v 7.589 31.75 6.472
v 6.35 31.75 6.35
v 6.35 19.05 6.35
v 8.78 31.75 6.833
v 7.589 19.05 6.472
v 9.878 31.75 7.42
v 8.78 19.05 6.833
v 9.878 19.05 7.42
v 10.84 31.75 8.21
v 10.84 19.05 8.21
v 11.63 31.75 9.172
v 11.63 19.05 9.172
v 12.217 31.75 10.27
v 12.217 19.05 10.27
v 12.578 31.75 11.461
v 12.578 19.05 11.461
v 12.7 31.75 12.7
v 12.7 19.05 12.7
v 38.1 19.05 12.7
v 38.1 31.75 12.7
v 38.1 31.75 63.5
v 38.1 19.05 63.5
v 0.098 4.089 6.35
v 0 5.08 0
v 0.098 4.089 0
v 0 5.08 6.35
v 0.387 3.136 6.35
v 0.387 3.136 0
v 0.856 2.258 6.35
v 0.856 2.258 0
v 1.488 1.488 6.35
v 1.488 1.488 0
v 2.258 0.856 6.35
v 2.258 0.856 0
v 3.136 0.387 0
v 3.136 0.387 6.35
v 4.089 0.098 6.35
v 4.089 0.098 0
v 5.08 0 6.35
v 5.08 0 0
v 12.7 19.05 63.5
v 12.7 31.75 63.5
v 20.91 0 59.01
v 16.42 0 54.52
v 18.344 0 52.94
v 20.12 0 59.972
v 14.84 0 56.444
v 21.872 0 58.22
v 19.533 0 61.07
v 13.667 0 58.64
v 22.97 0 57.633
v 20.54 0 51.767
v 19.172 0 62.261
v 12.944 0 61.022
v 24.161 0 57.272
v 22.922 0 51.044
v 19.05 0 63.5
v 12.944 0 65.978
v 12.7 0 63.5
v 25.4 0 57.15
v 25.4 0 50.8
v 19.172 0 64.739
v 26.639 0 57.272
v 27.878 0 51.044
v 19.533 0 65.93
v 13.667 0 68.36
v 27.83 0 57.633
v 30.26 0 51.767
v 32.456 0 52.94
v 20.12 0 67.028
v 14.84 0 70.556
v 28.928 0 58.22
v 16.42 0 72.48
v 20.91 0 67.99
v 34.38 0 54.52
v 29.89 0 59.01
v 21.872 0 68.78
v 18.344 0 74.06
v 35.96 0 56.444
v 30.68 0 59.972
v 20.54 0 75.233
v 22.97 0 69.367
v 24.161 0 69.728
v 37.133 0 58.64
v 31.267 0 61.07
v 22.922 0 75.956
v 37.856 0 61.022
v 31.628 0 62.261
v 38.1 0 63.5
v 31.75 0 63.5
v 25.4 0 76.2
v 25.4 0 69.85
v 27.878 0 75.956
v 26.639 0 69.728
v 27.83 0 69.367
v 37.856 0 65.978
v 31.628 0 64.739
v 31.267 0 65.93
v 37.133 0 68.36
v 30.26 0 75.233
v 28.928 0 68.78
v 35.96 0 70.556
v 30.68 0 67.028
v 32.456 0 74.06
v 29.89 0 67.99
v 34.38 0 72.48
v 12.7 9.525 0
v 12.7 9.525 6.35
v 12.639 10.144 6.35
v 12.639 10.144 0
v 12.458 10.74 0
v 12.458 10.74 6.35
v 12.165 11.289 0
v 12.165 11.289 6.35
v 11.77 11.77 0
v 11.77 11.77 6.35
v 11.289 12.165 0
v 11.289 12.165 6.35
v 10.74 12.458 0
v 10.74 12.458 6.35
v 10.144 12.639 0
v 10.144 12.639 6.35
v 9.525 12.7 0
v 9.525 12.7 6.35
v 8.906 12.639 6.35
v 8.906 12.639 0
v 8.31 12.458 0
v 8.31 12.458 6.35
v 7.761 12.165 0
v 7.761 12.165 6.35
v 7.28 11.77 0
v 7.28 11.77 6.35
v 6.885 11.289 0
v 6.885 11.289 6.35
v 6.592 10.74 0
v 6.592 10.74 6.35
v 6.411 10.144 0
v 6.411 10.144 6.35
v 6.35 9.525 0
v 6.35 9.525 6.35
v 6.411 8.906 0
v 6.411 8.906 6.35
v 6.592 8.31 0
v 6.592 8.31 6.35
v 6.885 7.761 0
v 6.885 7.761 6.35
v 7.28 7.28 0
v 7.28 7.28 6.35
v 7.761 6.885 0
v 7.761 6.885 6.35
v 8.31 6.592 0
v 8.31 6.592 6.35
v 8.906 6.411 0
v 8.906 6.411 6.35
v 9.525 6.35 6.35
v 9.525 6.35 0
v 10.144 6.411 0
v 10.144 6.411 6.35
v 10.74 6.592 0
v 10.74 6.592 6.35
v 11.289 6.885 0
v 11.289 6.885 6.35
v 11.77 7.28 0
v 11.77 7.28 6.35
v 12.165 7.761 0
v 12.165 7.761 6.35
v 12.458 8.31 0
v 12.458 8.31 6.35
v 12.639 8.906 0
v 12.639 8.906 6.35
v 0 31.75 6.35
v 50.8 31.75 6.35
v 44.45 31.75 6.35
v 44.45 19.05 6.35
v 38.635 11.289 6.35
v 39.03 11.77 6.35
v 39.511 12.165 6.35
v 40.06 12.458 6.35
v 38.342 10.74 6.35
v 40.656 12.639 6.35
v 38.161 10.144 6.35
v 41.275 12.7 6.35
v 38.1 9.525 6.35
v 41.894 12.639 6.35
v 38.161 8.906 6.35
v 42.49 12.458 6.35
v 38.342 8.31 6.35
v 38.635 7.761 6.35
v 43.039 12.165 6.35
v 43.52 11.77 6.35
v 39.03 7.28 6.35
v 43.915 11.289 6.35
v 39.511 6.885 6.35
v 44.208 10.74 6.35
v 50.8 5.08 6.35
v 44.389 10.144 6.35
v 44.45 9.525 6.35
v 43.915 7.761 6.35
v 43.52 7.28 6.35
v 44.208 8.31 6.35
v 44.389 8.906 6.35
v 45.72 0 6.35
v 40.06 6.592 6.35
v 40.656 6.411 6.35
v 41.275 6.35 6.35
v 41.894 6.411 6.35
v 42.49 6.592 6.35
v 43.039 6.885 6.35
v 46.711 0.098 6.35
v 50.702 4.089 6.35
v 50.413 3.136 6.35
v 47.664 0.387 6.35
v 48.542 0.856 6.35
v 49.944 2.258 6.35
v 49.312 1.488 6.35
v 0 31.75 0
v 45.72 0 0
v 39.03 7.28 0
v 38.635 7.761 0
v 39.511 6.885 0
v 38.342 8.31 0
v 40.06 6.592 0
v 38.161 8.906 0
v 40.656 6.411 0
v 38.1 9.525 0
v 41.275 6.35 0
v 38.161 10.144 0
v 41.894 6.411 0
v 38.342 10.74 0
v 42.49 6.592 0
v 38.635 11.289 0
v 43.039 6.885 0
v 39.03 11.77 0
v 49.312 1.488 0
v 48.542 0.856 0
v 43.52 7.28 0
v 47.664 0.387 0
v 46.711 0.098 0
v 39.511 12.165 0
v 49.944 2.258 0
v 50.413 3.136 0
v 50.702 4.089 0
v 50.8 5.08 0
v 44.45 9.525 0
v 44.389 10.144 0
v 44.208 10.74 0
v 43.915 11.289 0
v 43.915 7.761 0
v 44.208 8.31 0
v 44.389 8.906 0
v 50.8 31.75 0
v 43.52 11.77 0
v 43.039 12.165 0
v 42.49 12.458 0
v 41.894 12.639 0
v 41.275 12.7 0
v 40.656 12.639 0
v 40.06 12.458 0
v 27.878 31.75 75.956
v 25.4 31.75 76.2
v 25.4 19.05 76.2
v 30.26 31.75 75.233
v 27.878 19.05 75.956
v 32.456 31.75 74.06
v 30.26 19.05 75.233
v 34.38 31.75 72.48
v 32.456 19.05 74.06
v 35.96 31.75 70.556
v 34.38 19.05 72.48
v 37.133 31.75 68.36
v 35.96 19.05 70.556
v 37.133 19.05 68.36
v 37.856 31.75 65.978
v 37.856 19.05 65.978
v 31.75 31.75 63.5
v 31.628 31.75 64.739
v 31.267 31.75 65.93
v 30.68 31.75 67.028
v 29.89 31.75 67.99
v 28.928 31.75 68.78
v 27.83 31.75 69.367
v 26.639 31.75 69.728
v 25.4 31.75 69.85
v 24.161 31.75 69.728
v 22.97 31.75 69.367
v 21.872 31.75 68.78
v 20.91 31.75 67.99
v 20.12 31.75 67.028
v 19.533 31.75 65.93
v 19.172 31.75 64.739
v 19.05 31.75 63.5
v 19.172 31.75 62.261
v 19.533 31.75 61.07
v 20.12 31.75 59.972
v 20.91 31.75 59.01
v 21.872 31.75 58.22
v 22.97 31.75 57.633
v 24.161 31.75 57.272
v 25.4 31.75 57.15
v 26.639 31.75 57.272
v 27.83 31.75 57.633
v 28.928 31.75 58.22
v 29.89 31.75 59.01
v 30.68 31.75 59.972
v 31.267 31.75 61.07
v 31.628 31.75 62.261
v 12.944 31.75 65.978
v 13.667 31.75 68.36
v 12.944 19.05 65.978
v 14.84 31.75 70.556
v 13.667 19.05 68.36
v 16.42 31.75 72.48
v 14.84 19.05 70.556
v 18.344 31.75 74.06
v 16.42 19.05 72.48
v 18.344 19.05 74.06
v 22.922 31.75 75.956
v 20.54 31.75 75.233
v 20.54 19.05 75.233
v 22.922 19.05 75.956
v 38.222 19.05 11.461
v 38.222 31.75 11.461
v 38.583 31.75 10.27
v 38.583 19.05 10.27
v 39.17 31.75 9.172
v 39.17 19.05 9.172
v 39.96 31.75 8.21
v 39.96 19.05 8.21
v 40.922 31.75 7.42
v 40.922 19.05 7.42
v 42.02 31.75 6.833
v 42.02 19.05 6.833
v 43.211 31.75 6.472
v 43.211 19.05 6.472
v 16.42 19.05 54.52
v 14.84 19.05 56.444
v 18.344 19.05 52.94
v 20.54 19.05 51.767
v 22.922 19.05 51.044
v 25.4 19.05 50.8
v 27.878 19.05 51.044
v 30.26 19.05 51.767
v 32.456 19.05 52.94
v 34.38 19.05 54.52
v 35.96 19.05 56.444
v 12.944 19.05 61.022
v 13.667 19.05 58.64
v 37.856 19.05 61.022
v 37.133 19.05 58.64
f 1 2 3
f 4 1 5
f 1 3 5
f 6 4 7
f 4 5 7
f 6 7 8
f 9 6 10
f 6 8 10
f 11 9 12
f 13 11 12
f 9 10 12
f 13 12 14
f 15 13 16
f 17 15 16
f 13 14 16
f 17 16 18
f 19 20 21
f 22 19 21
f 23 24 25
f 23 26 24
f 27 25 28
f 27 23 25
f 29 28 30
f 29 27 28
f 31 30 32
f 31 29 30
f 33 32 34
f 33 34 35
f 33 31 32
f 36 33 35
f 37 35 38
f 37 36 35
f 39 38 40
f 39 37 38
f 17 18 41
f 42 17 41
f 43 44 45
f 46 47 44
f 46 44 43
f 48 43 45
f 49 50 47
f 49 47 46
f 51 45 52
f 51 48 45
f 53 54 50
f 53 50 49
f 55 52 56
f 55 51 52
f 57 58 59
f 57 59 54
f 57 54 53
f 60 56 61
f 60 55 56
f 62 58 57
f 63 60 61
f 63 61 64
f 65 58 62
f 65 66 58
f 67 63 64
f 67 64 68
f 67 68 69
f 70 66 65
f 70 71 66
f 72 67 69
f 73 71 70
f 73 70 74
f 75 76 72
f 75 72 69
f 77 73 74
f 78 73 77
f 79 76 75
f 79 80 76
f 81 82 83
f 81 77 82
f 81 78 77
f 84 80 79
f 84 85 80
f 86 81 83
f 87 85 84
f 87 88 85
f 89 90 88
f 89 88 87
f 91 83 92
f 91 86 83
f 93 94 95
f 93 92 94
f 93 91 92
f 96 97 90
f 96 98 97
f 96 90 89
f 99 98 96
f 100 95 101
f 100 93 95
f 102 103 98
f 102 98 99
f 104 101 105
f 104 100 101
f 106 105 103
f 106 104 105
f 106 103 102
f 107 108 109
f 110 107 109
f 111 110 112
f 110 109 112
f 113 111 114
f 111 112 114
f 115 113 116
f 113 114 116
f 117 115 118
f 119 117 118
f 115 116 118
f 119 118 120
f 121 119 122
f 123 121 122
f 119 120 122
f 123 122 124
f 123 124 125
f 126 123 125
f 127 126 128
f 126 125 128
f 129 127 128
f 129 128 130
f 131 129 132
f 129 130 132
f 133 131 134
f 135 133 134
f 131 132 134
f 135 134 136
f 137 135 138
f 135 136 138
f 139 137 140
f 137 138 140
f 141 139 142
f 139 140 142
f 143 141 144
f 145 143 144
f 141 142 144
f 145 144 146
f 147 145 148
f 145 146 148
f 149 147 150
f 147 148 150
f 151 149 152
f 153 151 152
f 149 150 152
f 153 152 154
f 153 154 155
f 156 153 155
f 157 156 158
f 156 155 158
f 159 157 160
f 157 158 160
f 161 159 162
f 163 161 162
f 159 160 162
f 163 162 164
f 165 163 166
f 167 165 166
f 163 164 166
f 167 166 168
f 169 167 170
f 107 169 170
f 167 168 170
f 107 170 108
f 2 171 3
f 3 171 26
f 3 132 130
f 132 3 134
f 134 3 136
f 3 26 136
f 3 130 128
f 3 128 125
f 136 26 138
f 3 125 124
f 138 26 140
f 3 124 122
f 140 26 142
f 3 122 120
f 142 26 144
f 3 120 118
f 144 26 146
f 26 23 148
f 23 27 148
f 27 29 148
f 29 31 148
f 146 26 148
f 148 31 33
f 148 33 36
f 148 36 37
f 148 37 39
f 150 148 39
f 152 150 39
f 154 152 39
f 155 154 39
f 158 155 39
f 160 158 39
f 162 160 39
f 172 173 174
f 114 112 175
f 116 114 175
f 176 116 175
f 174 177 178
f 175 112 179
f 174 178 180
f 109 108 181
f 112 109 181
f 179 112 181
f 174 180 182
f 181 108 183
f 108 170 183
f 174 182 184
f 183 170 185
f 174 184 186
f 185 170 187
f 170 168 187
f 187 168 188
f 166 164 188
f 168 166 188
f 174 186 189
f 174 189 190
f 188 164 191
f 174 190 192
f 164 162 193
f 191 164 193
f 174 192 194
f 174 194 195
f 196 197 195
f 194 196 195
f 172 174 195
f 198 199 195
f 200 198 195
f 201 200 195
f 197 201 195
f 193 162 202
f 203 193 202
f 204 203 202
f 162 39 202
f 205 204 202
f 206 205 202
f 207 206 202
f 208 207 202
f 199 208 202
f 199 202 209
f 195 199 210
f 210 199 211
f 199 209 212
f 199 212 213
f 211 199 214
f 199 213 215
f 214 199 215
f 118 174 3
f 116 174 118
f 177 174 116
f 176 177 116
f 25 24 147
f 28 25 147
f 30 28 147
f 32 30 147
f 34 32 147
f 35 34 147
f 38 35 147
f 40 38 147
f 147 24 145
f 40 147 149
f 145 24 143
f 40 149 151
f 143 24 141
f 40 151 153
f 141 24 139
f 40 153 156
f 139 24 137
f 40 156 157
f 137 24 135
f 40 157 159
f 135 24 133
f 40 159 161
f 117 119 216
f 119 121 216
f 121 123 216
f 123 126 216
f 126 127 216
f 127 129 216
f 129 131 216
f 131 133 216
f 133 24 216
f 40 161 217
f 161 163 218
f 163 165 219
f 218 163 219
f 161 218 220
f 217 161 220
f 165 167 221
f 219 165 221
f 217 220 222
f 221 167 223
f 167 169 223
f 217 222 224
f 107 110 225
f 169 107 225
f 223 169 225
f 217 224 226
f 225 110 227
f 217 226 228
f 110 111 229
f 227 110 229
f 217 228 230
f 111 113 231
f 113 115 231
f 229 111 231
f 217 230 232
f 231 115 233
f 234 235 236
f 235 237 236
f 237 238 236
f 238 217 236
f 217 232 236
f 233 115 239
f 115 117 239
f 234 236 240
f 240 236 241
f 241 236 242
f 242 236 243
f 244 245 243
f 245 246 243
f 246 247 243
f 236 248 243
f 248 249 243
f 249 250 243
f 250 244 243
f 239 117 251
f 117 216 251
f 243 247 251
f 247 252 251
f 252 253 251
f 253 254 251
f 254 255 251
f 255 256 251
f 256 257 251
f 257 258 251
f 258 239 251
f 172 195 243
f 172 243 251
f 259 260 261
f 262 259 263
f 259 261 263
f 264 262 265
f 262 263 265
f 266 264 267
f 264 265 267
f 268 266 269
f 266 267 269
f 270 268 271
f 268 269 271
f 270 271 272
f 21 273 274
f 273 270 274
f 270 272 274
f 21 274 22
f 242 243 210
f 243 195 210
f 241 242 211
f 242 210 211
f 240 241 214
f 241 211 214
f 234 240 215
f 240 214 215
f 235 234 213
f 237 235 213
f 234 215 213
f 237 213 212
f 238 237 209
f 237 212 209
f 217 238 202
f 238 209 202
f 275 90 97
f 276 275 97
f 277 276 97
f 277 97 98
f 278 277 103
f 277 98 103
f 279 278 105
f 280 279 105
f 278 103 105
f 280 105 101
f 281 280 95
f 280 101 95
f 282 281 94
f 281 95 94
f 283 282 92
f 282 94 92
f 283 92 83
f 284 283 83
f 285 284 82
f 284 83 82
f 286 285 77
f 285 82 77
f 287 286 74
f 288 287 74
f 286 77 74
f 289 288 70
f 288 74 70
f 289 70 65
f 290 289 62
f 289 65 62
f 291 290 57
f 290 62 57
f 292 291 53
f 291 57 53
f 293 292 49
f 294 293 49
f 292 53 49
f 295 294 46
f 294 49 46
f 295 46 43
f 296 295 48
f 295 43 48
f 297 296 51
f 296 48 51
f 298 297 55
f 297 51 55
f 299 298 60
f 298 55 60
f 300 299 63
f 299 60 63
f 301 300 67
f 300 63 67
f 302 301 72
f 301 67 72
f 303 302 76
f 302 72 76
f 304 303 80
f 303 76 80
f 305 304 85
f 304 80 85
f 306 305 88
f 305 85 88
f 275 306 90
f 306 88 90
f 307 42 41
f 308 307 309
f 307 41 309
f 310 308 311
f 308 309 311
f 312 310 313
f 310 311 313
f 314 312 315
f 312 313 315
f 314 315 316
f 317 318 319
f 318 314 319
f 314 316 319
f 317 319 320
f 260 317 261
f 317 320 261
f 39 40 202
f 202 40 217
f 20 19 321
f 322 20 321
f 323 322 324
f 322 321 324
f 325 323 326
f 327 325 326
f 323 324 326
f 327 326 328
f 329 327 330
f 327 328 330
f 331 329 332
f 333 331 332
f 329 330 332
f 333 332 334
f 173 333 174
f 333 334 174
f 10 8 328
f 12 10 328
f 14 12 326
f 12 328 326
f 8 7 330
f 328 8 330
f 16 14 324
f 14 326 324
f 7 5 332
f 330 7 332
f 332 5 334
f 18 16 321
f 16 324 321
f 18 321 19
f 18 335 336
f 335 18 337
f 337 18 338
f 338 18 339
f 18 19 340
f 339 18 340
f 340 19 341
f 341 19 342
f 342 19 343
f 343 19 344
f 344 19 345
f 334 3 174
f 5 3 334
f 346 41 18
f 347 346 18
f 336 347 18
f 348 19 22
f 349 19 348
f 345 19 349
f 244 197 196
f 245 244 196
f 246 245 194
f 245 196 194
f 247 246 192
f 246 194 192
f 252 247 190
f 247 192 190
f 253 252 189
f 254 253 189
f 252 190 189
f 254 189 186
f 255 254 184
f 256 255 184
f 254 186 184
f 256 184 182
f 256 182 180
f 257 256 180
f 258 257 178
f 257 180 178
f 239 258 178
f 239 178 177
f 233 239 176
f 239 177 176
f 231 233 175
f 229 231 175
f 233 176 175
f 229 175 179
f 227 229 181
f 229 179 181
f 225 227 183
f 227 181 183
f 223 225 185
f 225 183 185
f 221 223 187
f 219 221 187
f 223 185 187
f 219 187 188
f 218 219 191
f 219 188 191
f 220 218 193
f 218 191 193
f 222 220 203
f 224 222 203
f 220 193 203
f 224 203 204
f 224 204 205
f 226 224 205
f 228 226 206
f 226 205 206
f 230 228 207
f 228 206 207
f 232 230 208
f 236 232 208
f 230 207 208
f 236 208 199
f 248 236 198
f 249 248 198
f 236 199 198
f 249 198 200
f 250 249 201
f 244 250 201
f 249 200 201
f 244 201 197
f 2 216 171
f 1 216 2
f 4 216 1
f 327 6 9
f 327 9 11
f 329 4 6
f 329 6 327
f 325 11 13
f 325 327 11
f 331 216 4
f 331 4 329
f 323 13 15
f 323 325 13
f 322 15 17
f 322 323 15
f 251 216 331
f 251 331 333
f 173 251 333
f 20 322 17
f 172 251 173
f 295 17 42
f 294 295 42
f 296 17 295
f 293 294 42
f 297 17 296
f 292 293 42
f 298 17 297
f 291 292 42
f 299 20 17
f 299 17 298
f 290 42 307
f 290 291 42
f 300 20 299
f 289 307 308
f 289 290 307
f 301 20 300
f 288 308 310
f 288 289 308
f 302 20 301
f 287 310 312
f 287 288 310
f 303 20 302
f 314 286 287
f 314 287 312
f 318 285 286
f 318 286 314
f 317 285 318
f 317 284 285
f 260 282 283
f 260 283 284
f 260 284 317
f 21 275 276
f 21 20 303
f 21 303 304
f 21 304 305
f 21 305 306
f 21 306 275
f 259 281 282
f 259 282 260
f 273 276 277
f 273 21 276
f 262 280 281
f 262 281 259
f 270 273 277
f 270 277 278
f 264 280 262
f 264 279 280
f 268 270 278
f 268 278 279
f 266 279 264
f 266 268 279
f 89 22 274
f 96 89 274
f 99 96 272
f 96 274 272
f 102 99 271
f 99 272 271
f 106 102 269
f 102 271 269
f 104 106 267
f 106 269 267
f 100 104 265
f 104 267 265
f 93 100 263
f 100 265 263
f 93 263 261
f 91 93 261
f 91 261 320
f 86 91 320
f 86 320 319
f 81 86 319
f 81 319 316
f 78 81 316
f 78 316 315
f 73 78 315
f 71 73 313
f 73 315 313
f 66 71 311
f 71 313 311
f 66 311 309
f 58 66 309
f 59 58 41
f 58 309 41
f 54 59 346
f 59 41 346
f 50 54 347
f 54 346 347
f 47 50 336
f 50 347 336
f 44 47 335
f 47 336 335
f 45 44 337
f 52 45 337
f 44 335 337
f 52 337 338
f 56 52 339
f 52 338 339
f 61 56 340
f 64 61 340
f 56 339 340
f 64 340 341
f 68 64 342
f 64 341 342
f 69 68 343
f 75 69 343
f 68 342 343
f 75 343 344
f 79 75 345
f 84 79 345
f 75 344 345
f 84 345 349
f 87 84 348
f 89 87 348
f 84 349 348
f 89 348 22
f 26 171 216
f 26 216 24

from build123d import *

# Parameters (mm, degrees)
F0_W      = 50.8
F0_H      = 31.75
F1_DEPTH  = 6.35
F2_R      = 3.175
F3_DEPTH  = 6.35
F4_W      = 25.4
F4_H      = 69.85
F5_DEPTH  = 12.7
F7_DEPTH  = 25.4
F8_R      = 12.7
F9_DEPTH  = 19.05
F10_R     = 6.35
F11_DEPTH = 31.75
F12_R     = 5.08
F13_W     = 12.7
F13_H     = 12.7
F14_DEPTH = 12.7
F16_DEPTH = 25.4
F17_W     = 12.7
F17_H     = 12.7
F18_DEPTH = 12.7
F20_DEPTH = 25.4


with BuildPart() as f1:
    # F0 (on Top) → F1 (new body)
    with BuildSketch(Plane.XY):
        with Locations((25.4, 15.875)):
            Rectangle(F0_W, F0_H)
    extrude(amount=F1_DEPTH)

    # F2 (on face) → F3 (cut)
    with BuildSketch(Plane.XY.offset(6.35)):
        with Locations((41.275, 9.525)):
            Circle(F2_R)
        with Locations((9.525, 9.525)):
            Circle(F2_R)
    extrude(amount=-F3_DEPTH, mode=Mode.SUBTRACT)

    # F4 (on face) → F5 (join)
    with BuildSketch(Plane(origin=(0, 31.75, 0), x_dir=(-1, 0, 0), z_dir=(0, 1, 0))):
        with Locations((-25.4, 41.275)):
            Rectangle(F4_W, F4_H)
    extrude(amount=-F5_DEPTH)

    # F6 (on face) → F7 (cut)
    with BuildSketch(Plane.XZ.offset(-19.05)):
        with BuildLine():
            ThreePointArc((25.4, 76.2), (34.3802561211, 72.4802561211), (38.1, 63.5))
            Line((38.1, 63.5), (38.1, 76.2))
            Line((38.1, 76.2), (25.4, 76.2))
        make_face()
        with BuildLine():
            ThreePointArc((12.7, 63.5), (16.4197438789, 72.4802561211), (25.4, 76.2))
            Line((25.4, 76.2), (12.7, 76.2))
            Line((12.7, 76.2), (12.7, 63.5))
        make_face()
    extrude(amount=-F7_DEPTH, mode=Mode.SUBTRACT)

    # F8 (on face) → F9 (join)
    with BuildSketch(Plane.XZ.offset(-19.05)):
        with Locations((25.4, 63.5)):
            Circle(F8_R)
    extrude(amount=F9_DEPTH)

    # F10 (on face) → F11 (cut)
    with BuildSketch(Plane.XZ):
        with Locations((25.4, 63.5)):
            Circle(F10_R)
    extrude(amount=-F11_DEPTH, mode=Mode.SUBTRACT)

    # F12
    f12_edges = [f1.edges().sort_by_distance(p)[0] for p in [
        (0, 0, 3.175),
        (50.8, 0, 3.175),
    ]]
    fillet(f12_edges, radius=F12_R)

    # F13 (on face) → F14 (join)
    with BuildSketch(Plane.YZ.offset(38.1)):
        with Locations((25.4, 12.7)):
            Rectangle(F13_W, F13_H)
    extrude(amount=F14_DEPTH)

    # F15 (on face) → F16 (cut)
    with BuildSketch(Plane.XZ.offset(-19.05)):
        with BuildLine():
            ThreePointArc((38.1, 12.7), (44.45, 6.35), (50.8, 12.7))
            ThreePointArc((50.8, 12.7), (44.45, 19.05), (38.1, 12.7))
        make_face()
        with BuildLine():
            Line((50.8, 19.05), (44.45, 19.05))
            ThreePointArc((44.45, 19.05), (48.9401280605, 17.1901280605), (50.8, 12.7))
            Line((50.8, 12.7), (50.8, 19.05))
        make_face()
        with BuildLine():
            Line((44.45, 19.05), (38.1, 19.05))
            Line((38.1, 19.05), (38.1, 12.7))
            ThreePointArc((38.1, 12.7), (39.9598719395, 17.1901280605), (44.45, 19.05))
        make_face()
        with BuildLine():
            ThreePointArc((50.8, 12.7), (48.9401280605, 8.2098719395), (44.45, 6.35))
            Line((44.45, 6.35), (50.8, 6.35))
            Line((50.8, 6.35), (50.8, 12.7))
        make_face()
    extrude(amount=-F16_DEPTH, mode=Mode.SUBTRACT)

    # F17 (on face) → F18 (join)
    with BuildSketch(Plane(origin=(12.7, 0, 0), x_dir=(0, -1, 0), z_dir=(-1, 0, 0))):
        with Locations((-25.4, 12.7)):
            Rectangle(F17_W, F17_H)
    extrude(amount=F18_DEPTH)

    # F19 (on face) → F20 (cut)
    with BuildSketch(Plane.XZ.offset(-19.05)):
        with BuildLine():
            ThreePointArc((6.35, 6.35), (10.8401280605, 8.2098719395), (12.7, 12.7))
            ThreePointArc((12.7, 12.7), (10.8401280605, 17.1901280605), (6.35, 19.05))
            ThreePointArc((6.35, 19.05), (1.8598719395, 17.1901280605), (0, 12.7))
            ThreePointArc((0, 12.7), (1.8598719395, 8.2098719395), (6.35, 6.35))
        make_face()
        with BuildLine():
            ThreePointArc((0, 12.7), (1.8598719395, 17.1901280605), (6.35, 19.05))
            Line((6.35, 19.05), (0, 19.05))
            Line((0, 19.05), (0, 12.7))
        make_face()
        with BuildLine():
            Line((0, 6.35), (6.35, 6.35))
            ThreePointArc((6.35, 6.35), (1.8598719395, 8.2098719395), (0, 12.7))
            Line((0, 12.7), (0, 6.35))
        make_face()
        with BuildLine():
            Line((12.7, 12.7), (12.7, 19.05))
            Line((12.7, 19.05), (6.35, 19.05))
            ThreePointArc((6.35, 19.05), (10.8401280605, 17.1901280605), (12.7, 12.7))
        make_face()
    extrude(amount=-F20_DEPTH, mode=Mode.SUBTRACT)


solid = f1.part
